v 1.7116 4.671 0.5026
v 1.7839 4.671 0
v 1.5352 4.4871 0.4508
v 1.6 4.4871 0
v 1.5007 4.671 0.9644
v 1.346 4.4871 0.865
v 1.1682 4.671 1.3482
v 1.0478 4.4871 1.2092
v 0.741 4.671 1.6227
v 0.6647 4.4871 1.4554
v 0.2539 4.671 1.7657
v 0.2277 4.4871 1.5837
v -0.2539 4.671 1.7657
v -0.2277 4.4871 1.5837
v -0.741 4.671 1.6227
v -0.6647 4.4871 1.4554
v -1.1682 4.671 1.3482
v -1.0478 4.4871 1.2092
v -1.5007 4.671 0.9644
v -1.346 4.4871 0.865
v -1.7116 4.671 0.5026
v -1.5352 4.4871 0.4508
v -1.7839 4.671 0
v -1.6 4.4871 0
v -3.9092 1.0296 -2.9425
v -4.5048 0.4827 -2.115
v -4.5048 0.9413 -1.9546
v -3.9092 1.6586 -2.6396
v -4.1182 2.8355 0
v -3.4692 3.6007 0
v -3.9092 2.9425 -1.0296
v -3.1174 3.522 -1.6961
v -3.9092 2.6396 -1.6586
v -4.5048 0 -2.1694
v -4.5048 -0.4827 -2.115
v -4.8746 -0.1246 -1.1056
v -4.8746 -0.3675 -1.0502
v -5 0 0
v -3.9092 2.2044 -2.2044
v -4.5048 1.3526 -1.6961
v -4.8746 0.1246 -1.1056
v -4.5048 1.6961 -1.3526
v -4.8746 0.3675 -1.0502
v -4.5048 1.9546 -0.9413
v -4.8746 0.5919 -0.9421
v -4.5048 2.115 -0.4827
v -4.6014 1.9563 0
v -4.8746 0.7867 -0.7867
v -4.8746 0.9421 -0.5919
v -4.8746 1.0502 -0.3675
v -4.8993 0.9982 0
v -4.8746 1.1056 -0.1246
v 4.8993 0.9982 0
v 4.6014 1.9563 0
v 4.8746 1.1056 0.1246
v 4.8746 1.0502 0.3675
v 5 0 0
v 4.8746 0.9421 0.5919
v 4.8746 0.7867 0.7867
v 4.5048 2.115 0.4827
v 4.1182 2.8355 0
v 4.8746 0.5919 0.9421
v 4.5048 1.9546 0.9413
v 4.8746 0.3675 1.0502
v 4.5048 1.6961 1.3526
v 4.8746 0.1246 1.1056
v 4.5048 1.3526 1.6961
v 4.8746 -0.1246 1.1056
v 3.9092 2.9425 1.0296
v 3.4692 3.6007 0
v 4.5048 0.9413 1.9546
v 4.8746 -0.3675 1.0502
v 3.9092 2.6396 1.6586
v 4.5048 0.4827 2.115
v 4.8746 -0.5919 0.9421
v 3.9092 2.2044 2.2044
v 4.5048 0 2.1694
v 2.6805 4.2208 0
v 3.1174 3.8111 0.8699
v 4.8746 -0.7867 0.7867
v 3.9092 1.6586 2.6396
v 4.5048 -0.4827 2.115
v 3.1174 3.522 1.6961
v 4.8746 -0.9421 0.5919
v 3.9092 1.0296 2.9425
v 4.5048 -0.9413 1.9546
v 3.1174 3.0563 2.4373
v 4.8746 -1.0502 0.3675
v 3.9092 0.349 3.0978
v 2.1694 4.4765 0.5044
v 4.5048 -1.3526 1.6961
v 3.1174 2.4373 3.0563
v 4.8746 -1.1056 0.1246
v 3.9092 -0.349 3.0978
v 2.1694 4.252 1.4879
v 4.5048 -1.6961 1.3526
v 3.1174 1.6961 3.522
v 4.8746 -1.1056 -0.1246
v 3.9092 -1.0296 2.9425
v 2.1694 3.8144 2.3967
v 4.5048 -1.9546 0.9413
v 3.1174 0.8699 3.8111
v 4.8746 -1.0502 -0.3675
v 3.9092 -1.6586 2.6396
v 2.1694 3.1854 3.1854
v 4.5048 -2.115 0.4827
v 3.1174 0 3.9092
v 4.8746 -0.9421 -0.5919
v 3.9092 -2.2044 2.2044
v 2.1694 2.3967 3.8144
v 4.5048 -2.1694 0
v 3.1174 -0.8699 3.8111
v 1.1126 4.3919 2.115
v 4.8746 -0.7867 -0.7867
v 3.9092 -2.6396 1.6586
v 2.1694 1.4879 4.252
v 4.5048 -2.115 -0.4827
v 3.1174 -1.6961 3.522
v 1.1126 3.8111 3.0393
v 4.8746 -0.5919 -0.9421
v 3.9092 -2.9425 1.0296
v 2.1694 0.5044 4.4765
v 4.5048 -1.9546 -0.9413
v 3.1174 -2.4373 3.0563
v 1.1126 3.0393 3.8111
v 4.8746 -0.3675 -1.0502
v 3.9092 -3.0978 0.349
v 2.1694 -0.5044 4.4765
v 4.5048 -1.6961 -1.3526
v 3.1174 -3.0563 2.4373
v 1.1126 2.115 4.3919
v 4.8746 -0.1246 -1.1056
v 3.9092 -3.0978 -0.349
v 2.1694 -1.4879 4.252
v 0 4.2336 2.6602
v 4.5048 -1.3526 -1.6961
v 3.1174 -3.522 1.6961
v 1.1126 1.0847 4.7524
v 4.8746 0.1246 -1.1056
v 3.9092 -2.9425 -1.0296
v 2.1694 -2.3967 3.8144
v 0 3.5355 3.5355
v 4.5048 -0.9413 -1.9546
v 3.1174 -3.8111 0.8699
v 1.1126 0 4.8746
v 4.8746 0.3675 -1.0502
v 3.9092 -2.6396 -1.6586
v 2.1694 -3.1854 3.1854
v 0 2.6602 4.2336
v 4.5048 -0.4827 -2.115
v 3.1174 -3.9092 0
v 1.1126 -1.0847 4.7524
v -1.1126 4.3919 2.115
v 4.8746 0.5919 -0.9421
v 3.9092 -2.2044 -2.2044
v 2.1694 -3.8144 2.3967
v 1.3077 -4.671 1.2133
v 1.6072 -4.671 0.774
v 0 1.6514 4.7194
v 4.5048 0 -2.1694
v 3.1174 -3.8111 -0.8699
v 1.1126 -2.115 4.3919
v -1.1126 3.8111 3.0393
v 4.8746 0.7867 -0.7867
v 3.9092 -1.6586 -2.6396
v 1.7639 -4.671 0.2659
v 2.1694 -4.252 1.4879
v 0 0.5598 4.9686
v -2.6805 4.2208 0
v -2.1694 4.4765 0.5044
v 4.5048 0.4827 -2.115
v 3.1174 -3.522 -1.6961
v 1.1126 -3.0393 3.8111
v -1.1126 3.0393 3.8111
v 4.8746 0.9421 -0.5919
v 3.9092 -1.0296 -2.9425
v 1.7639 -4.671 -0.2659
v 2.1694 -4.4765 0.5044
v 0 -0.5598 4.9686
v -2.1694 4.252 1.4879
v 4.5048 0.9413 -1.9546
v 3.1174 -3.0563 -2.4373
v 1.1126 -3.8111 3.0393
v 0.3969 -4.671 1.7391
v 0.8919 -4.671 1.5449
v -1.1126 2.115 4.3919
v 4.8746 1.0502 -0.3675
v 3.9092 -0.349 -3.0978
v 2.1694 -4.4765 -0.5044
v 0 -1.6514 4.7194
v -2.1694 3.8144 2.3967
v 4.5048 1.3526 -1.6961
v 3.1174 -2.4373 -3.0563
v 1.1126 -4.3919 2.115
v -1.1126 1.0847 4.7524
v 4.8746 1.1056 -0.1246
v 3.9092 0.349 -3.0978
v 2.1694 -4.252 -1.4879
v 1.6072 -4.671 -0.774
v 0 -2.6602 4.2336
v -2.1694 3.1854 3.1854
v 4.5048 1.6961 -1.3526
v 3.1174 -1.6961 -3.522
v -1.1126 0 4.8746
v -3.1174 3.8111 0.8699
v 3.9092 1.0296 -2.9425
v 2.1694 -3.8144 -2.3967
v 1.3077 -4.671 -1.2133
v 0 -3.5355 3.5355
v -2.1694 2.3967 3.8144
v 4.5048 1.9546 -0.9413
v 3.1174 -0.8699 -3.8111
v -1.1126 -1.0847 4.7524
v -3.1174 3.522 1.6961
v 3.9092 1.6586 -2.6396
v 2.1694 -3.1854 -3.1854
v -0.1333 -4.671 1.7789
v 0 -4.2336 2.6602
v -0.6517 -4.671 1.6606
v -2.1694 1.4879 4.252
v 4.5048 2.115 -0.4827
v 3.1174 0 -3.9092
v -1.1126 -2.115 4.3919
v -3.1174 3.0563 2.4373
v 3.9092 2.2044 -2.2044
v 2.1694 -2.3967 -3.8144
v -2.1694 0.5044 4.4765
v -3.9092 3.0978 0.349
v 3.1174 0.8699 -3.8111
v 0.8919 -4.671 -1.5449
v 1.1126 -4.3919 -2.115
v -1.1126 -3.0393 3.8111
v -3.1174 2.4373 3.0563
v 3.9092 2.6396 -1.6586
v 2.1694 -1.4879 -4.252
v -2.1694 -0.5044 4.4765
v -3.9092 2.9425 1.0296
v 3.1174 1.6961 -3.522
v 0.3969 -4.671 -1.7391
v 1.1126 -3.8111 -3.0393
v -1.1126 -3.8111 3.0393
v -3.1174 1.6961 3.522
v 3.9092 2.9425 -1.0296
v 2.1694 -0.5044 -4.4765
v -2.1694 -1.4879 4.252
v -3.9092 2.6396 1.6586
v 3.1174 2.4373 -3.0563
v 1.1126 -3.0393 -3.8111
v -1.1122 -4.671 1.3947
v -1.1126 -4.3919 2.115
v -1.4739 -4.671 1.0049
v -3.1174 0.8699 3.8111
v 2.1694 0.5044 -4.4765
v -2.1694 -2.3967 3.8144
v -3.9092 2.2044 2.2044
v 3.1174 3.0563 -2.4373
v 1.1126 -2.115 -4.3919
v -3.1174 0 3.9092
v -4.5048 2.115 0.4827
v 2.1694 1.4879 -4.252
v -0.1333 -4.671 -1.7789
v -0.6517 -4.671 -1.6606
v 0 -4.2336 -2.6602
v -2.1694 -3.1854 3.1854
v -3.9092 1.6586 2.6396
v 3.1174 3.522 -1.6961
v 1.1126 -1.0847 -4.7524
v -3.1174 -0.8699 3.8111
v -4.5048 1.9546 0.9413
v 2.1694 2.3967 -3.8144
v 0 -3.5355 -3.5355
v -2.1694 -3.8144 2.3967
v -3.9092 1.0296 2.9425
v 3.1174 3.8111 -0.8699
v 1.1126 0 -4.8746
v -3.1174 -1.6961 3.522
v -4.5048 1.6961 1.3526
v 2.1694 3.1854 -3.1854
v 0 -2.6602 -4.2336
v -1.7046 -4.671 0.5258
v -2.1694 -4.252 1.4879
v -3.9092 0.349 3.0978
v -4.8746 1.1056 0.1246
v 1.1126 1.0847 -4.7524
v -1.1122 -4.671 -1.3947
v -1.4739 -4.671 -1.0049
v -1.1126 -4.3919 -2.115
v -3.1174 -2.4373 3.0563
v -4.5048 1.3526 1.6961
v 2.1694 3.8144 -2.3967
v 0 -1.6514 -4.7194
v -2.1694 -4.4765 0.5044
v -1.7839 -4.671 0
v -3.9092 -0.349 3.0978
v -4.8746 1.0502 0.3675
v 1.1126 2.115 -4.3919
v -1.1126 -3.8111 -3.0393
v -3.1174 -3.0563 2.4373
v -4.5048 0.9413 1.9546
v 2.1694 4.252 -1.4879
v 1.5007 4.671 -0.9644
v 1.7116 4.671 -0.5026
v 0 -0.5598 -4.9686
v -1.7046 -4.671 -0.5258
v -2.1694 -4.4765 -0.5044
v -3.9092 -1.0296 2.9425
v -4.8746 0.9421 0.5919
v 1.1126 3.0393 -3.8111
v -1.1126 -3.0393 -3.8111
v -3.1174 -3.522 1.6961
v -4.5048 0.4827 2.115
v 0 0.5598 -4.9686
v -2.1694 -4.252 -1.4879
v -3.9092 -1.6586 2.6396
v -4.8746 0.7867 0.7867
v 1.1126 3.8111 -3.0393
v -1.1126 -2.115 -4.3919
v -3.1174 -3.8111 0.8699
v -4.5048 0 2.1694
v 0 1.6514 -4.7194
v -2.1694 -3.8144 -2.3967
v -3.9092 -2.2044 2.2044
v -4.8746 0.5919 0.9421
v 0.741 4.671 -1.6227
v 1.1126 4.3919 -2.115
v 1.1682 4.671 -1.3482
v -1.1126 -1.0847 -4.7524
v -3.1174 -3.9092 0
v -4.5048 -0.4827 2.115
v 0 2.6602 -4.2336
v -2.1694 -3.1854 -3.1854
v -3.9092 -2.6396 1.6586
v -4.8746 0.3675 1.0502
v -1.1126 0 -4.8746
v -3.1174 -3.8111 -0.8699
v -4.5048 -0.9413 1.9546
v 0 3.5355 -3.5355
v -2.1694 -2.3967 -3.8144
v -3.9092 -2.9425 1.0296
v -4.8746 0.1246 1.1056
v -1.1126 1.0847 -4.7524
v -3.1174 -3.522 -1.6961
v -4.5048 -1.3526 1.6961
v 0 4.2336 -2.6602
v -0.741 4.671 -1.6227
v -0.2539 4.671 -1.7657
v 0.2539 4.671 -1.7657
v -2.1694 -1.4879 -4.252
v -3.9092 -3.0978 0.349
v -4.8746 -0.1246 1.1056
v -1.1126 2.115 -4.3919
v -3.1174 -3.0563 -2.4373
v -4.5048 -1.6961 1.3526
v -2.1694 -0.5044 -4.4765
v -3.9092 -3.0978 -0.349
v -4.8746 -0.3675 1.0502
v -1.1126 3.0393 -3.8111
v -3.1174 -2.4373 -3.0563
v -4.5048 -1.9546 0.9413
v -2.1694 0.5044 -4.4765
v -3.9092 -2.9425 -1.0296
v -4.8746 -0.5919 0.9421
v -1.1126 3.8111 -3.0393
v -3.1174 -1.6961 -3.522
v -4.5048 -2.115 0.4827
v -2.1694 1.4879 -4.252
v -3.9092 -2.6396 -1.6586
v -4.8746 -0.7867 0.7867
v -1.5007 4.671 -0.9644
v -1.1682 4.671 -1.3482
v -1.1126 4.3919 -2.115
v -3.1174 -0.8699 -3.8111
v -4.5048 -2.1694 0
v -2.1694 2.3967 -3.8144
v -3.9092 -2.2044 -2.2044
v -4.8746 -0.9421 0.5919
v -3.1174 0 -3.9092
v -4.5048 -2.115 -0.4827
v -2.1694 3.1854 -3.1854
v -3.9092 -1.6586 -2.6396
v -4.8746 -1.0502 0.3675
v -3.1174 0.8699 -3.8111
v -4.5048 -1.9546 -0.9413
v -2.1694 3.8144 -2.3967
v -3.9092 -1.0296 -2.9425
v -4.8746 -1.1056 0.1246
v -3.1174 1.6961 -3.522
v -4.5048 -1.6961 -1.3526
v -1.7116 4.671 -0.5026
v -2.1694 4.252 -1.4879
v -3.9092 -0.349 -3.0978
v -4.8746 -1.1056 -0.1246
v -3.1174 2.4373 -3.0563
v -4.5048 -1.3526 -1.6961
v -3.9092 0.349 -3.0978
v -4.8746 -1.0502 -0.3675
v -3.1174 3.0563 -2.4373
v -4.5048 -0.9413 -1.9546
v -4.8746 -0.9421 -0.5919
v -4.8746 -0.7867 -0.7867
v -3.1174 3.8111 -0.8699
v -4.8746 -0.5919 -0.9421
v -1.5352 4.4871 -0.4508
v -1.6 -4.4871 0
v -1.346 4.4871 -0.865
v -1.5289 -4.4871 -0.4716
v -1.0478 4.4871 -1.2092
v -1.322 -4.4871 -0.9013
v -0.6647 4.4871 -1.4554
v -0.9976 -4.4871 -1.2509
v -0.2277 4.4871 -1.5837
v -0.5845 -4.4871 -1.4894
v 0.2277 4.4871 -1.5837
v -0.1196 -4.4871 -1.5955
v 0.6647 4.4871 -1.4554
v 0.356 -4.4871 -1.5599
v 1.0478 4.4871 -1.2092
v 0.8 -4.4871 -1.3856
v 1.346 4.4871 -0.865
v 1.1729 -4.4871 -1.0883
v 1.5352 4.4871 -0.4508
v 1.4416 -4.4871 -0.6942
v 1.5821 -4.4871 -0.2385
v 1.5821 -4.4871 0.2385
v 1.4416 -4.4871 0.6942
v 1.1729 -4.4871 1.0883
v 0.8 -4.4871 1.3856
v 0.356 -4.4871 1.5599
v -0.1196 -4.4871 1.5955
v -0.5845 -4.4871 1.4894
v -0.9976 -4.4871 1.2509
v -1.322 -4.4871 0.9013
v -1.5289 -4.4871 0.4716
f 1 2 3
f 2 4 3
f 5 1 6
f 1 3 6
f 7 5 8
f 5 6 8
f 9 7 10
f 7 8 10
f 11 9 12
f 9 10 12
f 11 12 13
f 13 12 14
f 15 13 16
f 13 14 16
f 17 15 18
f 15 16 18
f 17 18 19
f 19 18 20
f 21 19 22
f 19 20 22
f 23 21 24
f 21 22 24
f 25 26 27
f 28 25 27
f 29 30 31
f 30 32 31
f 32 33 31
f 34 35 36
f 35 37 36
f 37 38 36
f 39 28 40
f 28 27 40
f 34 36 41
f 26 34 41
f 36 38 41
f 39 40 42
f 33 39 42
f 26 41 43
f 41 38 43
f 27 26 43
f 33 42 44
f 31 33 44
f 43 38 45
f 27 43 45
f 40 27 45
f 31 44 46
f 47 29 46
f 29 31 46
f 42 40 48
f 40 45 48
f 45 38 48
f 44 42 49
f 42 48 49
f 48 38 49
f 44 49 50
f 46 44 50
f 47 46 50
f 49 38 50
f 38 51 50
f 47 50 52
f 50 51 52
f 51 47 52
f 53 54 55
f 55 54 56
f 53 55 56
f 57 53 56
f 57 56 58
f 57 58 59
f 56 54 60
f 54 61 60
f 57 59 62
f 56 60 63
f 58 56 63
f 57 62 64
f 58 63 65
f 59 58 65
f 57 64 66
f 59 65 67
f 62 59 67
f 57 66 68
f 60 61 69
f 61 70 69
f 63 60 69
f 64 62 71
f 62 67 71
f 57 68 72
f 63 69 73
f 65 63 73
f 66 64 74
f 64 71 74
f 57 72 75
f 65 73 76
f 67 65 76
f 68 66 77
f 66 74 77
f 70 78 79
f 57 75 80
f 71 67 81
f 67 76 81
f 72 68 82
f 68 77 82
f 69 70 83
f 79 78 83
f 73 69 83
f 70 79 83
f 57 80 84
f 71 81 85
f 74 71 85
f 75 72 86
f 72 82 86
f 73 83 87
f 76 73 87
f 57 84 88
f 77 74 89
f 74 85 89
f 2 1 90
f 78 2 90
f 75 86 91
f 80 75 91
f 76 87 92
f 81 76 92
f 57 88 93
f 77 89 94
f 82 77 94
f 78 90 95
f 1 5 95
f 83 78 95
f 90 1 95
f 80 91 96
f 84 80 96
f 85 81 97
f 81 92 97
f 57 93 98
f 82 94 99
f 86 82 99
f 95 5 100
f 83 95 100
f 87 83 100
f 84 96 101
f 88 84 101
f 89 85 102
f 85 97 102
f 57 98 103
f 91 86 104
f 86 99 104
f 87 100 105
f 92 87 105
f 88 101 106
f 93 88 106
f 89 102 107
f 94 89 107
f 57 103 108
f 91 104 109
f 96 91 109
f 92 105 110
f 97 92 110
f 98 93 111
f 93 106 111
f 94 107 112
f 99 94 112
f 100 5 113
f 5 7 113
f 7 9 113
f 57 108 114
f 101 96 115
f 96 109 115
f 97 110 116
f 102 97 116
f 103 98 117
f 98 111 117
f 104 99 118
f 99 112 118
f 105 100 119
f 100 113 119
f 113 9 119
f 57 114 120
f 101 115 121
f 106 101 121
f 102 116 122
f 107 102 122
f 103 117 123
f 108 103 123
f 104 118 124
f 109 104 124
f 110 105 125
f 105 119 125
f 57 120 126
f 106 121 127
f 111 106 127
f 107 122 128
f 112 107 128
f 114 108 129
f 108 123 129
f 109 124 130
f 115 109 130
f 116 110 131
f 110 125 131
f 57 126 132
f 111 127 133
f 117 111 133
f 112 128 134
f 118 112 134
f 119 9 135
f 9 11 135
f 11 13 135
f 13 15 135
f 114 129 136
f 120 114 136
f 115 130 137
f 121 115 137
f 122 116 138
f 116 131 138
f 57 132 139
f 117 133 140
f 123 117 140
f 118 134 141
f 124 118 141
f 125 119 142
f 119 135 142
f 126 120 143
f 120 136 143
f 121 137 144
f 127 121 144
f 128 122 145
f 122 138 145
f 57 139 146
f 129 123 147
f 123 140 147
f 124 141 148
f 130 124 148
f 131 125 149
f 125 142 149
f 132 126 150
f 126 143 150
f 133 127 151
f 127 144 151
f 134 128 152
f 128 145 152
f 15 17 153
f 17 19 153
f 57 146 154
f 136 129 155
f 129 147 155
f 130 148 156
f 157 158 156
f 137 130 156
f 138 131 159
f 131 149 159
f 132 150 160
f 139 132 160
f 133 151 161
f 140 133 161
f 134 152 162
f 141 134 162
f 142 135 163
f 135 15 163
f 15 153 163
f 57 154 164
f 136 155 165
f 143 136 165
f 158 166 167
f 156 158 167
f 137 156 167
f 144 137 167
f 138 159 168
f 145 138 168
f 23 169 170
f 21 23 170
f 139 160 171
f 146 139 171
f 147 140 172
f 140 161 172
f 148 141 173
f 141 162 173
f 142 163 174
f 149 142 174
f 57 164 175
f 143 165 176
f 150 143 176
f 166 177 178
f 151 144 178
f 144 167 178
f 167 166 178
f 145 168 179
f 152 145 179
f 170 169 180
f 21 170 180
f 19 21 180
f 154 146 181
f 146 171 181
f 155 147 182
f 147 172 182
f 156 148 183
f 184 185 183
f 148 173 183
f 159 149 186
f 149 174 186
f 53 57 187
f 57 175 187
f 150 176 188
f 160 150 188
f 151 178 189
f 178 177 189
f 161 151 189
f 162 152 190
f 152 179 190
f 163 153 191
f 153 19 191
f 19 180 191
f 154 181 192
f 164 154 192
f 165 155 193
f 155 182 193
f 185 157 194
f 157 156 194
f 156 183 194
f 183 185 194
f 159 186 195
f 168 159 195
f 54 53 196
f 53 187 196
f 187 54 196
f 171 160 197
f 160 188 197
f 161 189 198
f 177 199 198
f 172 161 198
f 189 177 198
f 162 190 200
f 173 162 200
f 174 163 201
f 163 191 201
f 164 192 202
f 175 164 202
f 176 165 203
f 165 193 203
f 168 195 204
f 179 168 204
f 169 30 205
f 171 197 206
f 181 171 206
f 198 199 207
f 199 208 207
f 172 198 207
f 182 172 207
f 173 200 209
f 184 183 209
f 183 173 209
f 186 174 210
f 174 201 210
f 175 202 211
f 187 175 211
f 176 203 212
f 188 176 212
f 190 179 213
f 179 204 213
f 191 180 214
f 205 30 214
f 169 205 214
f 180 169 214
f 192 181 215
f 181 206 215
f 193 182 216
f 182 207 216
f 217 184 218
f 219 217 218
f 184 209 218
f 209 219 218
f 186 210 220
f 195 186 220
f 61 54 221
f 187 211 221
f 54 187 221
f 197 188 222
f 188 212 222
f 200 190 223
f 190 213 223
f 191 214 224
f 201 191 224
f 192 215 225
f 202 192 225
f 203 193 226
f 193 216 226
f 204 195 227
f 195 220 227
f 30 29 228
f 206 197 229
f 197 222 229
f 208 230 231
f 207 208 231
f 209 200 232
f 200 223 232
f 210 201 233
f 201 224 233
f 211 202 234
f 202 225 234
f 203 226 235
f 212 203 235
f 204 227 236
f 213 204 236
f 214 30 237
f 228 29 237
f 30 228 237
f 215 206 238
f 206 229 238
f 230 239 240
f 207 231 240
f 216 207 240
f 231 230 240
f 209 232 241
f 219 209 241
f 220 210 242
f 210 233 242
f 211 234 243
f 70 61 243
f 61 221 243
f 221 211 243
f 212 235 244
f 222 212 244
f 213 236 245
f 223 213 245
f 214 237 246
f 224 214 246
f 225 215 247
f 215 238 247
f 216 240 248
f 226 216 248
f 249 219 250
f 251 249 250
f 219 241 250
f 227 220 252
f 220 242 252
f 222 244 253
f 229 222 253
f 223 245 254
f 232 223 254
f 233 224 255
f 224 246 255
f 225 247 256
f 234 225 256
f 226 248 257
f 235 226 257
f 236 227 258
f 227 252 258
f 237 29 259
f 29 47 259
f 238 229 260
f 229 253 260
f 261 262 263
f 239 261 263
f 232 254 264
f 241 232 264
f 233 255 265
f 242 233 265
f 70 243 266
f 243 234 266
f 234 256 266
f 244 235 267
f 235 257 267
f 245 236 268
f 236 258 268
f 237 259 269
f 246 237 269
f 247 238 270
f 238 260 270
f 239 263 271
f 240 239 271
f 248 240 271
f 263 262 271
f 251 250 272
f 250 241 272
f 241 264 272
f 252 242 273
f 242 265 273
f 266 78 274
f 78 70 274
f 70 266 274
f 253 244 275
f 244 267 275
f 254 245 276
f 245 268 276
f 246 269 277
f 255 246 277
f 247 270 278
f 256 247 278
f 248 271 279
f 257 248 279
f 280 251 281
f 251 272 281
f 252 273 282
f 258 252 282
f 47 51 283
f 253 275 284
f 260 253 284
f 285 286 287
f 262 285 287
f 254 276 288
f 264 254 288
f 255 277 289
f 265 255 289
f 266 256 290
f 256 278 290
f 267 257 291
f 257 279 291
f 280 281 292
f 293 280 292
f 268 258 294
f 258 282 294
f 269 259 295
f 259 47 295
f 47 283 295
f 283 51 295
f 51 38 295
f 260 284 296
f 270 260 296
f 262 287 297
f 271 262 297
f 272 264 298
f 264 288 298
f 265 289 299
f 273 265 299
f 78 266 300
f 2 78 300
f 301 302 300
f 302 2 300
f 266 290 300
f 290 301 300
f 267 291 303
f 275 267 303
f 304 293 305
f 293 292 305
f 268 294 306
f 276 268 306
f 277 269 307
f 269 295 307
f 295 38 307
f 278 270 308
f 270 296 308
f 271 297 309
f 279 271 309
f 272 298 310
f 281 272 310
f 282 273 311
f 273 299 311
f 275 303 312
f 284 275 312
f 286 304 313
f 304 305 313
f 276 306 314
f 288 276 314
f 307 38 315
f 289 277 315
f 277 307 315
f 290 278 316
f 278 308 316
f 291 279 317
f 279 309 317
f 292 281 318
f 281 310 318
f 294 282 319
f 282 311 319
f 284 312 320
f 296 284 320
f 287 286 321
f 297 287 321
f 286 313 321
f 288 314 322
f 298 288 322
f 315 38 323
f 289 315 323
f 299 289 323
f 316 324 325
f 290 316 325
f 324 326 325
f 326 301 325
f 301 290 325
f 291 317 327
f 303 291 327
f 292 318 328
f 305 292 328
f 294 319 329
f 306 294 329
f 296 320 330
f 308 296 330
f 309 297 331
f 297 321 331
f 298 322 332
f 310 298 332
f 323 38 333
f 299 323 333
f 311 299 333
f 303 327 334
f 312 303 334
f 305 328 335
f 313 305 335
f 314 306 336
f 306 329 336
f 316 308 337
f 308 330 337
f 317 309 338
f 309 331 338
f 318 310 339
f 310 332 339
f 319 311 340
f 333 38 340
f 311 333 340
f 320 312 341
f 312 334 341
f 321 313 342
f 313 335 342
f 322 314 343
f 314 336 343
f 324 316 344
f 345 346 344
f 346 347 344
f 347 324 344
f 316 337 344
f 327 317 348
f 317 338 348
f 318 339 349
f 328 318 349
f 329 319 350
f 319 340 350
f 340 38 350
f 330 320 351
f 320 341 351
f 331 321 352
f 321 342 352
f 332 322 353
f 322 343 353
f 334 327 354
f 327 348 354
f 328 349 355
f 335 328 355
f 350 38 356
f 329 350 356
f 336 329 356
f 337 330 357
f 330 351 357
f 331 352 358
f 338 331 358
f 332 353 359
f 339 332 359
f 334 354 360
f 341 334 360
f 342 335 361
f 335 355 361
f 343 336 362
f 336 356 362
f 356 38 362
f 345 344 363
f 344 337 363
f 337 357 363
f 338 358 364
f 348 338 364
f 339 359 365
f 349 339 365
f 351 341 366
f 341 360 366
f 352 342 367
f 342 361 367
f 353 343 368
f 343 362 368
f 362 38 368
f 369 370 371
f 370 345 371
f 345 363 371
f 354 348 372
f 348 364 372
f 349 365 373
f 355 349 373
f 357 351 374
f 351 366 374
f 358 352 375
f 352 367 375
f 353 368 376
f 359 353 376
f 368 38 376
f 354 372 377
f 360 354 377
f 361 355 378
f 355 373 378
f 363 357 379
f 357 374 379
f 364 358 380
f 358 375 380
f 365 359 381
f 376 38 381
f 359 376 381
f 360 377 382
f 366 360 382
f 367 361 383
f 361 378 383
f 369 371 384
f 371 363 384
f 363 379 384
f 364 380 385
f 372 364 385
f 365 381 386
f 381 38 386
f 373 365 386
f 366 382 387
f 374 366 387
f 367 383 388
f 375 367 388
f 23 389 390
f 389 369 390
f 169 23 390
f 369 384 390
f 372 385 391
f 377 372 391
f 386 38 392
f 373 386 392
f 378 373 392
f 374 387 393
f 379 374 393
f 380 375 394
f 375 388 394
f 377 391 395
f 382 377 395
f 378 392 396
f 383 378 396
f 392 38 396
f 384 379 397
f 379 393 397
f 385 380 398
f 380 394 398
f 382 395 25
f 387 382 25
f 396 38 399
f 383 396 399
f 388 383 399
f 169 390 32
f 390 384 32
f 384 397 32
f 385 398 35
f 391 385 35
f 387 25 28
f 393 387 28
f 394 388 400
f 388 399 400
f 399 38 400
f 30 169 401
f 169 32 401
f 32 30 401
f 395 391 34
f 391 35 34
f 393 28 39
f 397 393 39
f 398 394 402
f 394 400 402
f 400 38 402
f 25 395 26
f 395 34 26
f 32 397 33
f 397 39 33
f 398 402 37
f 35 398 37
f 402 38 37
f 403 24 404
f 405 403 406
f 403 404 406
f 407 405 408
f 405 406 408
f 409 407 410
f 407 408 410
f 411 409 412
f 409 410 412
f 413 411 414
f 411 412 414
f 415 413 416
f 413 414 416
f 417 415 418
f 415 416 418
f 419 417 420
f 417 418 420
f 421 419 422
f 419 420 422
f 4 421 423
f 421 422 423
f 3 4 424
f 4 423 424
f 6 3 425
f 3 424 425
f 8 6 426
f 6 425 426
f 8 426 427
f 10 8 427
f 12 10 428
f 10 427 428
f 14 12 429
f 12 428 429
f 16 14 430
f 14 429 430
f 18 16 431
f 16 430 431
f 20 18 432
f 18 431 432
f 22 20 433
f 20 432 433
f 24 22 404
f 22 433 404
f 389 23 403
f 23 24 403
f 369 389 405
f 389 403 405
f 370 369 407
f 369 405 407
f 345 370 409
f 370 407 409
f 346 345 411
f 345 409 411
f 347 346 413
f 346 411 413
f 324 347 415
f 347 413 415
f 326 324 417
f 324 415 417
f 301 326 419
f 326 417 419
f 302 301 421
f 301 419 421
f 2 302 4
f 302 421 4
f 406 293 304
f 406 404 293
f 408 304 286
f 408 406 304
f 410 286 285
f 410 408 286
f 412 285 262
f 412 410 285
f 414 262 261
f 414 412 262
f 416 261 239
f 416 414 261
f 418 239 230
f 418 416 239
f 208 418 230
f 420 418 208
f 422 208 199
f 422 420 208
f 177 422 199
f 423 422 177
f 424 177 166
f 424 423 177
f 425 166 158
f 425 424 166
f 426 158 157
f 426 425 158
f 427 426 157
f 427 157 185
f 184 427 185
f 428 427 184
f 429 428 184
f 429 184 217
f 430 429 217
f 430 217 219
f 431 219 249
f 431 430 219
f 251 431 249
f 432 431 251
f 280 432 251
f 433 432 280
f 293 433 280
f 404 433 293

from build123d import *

# Parameters (mm, degrees)
M3_CLEARANCE_HOLE1_D = 3.2
CHAMFER1_SIZE        = 0.25


with BuildPart() as part:
    # Sketch2 → Revolve1 (revolve)
    with BuildSketch(Plane.XY):
        with BuildLine():
            Line((-5, 0), (5, 0))
            ThreePointArc((5, 0), (0, 5), (-5, 0))
        make_face()
    revolve(axis=Axis((-5, 0, 0), (1, 0, 0)))

    # M3 Clearance Hole1 (through all)
    with Locations(Plane(origin=(0, 5, 0), x_dir=(1, 0, 0), z_dir=(0, 1, 0))):
        with Locations((0, 0)):
            Hole(M3_CLEARANCE_HOLE1_D / 2)

    # Chamfer1
    # the kernel refuses this chamfer: 0.25, 0.197251491 mm, written as the material it takes off along each edge
    with BuildSketch(Plane(origin=(-3e-09, -4.737087713, 0), x_dir=(-1.0, 0, -1.7241398847038223e-10), z_dir=(-1.7241398847038223e-10, 0, 1.0))) as chamfer1_piece_1:
        with BuildLine():
            Line((1.783867045, -0.066132952), (1.600000003, -0.249999994))
            Line((1.600000003, -0.249999994), (1.599999997, 0))
            ThreePointArc((1.599999997, 0), (1.69425958, -0.032889111), (1.783867045, -0.066132952))
        make_face()
    revolve(axis=Axis((-3e-09, -4.737087713, 0), (0, -1, 0)), mode=Mode.SUBTRACT)
    with BuildSketch(Plane(origin=(0, 4.737087713, 5e-09), x_dir=(-1.0, 0, -2.962106121087604e-09), z_dir=(-2.962106121087604e-09, 0, 1.0))) as chamfer1_piece_2:
        with BuildLine():
            Line((1.783867047, 0.066132952), (1.600000005, 0.249999995))
            Line((1.600000005, 0.249999995), (1.6, 0))
            ThreePointArc((1.6, 0), (1.694259582, 0.032889111), (1.783867047, 0.066132952))
        make_face()
    revolve(axis=Axis((0, 4.737087713, 5e-09), (0, -1, 0)), revolution_arc=179.999999661, mode=Mode.SUBTRACT)
    with BuildSketch(Plane(origin=(0, 4.737087713, 0), x_dir=(1.0, 0, -6.014235446318052e-11), z_dir=(-6.014235446318052e-11, -1.2821909266166277e-15, -1.0))) as chamfer1_piece_3:
        with BuildLine():
            Line((1.783867046, 0.066132954), (1.6, CHAMFER1_SIZE))
            Line((1.6, CHAMFER1_SIZE), (1.6, 0))
            ThreePointArc((1.6, 0), (1.694259582, 0.032889113), (1.783867046, 0.066132954))
        make_face()
    revolve(axis=Axis((0, 4.737087713, 0), (0, -1, 0)), revolution_arc=180.000000007, mode=Mode.SUBTRACT)


solid = part.part
